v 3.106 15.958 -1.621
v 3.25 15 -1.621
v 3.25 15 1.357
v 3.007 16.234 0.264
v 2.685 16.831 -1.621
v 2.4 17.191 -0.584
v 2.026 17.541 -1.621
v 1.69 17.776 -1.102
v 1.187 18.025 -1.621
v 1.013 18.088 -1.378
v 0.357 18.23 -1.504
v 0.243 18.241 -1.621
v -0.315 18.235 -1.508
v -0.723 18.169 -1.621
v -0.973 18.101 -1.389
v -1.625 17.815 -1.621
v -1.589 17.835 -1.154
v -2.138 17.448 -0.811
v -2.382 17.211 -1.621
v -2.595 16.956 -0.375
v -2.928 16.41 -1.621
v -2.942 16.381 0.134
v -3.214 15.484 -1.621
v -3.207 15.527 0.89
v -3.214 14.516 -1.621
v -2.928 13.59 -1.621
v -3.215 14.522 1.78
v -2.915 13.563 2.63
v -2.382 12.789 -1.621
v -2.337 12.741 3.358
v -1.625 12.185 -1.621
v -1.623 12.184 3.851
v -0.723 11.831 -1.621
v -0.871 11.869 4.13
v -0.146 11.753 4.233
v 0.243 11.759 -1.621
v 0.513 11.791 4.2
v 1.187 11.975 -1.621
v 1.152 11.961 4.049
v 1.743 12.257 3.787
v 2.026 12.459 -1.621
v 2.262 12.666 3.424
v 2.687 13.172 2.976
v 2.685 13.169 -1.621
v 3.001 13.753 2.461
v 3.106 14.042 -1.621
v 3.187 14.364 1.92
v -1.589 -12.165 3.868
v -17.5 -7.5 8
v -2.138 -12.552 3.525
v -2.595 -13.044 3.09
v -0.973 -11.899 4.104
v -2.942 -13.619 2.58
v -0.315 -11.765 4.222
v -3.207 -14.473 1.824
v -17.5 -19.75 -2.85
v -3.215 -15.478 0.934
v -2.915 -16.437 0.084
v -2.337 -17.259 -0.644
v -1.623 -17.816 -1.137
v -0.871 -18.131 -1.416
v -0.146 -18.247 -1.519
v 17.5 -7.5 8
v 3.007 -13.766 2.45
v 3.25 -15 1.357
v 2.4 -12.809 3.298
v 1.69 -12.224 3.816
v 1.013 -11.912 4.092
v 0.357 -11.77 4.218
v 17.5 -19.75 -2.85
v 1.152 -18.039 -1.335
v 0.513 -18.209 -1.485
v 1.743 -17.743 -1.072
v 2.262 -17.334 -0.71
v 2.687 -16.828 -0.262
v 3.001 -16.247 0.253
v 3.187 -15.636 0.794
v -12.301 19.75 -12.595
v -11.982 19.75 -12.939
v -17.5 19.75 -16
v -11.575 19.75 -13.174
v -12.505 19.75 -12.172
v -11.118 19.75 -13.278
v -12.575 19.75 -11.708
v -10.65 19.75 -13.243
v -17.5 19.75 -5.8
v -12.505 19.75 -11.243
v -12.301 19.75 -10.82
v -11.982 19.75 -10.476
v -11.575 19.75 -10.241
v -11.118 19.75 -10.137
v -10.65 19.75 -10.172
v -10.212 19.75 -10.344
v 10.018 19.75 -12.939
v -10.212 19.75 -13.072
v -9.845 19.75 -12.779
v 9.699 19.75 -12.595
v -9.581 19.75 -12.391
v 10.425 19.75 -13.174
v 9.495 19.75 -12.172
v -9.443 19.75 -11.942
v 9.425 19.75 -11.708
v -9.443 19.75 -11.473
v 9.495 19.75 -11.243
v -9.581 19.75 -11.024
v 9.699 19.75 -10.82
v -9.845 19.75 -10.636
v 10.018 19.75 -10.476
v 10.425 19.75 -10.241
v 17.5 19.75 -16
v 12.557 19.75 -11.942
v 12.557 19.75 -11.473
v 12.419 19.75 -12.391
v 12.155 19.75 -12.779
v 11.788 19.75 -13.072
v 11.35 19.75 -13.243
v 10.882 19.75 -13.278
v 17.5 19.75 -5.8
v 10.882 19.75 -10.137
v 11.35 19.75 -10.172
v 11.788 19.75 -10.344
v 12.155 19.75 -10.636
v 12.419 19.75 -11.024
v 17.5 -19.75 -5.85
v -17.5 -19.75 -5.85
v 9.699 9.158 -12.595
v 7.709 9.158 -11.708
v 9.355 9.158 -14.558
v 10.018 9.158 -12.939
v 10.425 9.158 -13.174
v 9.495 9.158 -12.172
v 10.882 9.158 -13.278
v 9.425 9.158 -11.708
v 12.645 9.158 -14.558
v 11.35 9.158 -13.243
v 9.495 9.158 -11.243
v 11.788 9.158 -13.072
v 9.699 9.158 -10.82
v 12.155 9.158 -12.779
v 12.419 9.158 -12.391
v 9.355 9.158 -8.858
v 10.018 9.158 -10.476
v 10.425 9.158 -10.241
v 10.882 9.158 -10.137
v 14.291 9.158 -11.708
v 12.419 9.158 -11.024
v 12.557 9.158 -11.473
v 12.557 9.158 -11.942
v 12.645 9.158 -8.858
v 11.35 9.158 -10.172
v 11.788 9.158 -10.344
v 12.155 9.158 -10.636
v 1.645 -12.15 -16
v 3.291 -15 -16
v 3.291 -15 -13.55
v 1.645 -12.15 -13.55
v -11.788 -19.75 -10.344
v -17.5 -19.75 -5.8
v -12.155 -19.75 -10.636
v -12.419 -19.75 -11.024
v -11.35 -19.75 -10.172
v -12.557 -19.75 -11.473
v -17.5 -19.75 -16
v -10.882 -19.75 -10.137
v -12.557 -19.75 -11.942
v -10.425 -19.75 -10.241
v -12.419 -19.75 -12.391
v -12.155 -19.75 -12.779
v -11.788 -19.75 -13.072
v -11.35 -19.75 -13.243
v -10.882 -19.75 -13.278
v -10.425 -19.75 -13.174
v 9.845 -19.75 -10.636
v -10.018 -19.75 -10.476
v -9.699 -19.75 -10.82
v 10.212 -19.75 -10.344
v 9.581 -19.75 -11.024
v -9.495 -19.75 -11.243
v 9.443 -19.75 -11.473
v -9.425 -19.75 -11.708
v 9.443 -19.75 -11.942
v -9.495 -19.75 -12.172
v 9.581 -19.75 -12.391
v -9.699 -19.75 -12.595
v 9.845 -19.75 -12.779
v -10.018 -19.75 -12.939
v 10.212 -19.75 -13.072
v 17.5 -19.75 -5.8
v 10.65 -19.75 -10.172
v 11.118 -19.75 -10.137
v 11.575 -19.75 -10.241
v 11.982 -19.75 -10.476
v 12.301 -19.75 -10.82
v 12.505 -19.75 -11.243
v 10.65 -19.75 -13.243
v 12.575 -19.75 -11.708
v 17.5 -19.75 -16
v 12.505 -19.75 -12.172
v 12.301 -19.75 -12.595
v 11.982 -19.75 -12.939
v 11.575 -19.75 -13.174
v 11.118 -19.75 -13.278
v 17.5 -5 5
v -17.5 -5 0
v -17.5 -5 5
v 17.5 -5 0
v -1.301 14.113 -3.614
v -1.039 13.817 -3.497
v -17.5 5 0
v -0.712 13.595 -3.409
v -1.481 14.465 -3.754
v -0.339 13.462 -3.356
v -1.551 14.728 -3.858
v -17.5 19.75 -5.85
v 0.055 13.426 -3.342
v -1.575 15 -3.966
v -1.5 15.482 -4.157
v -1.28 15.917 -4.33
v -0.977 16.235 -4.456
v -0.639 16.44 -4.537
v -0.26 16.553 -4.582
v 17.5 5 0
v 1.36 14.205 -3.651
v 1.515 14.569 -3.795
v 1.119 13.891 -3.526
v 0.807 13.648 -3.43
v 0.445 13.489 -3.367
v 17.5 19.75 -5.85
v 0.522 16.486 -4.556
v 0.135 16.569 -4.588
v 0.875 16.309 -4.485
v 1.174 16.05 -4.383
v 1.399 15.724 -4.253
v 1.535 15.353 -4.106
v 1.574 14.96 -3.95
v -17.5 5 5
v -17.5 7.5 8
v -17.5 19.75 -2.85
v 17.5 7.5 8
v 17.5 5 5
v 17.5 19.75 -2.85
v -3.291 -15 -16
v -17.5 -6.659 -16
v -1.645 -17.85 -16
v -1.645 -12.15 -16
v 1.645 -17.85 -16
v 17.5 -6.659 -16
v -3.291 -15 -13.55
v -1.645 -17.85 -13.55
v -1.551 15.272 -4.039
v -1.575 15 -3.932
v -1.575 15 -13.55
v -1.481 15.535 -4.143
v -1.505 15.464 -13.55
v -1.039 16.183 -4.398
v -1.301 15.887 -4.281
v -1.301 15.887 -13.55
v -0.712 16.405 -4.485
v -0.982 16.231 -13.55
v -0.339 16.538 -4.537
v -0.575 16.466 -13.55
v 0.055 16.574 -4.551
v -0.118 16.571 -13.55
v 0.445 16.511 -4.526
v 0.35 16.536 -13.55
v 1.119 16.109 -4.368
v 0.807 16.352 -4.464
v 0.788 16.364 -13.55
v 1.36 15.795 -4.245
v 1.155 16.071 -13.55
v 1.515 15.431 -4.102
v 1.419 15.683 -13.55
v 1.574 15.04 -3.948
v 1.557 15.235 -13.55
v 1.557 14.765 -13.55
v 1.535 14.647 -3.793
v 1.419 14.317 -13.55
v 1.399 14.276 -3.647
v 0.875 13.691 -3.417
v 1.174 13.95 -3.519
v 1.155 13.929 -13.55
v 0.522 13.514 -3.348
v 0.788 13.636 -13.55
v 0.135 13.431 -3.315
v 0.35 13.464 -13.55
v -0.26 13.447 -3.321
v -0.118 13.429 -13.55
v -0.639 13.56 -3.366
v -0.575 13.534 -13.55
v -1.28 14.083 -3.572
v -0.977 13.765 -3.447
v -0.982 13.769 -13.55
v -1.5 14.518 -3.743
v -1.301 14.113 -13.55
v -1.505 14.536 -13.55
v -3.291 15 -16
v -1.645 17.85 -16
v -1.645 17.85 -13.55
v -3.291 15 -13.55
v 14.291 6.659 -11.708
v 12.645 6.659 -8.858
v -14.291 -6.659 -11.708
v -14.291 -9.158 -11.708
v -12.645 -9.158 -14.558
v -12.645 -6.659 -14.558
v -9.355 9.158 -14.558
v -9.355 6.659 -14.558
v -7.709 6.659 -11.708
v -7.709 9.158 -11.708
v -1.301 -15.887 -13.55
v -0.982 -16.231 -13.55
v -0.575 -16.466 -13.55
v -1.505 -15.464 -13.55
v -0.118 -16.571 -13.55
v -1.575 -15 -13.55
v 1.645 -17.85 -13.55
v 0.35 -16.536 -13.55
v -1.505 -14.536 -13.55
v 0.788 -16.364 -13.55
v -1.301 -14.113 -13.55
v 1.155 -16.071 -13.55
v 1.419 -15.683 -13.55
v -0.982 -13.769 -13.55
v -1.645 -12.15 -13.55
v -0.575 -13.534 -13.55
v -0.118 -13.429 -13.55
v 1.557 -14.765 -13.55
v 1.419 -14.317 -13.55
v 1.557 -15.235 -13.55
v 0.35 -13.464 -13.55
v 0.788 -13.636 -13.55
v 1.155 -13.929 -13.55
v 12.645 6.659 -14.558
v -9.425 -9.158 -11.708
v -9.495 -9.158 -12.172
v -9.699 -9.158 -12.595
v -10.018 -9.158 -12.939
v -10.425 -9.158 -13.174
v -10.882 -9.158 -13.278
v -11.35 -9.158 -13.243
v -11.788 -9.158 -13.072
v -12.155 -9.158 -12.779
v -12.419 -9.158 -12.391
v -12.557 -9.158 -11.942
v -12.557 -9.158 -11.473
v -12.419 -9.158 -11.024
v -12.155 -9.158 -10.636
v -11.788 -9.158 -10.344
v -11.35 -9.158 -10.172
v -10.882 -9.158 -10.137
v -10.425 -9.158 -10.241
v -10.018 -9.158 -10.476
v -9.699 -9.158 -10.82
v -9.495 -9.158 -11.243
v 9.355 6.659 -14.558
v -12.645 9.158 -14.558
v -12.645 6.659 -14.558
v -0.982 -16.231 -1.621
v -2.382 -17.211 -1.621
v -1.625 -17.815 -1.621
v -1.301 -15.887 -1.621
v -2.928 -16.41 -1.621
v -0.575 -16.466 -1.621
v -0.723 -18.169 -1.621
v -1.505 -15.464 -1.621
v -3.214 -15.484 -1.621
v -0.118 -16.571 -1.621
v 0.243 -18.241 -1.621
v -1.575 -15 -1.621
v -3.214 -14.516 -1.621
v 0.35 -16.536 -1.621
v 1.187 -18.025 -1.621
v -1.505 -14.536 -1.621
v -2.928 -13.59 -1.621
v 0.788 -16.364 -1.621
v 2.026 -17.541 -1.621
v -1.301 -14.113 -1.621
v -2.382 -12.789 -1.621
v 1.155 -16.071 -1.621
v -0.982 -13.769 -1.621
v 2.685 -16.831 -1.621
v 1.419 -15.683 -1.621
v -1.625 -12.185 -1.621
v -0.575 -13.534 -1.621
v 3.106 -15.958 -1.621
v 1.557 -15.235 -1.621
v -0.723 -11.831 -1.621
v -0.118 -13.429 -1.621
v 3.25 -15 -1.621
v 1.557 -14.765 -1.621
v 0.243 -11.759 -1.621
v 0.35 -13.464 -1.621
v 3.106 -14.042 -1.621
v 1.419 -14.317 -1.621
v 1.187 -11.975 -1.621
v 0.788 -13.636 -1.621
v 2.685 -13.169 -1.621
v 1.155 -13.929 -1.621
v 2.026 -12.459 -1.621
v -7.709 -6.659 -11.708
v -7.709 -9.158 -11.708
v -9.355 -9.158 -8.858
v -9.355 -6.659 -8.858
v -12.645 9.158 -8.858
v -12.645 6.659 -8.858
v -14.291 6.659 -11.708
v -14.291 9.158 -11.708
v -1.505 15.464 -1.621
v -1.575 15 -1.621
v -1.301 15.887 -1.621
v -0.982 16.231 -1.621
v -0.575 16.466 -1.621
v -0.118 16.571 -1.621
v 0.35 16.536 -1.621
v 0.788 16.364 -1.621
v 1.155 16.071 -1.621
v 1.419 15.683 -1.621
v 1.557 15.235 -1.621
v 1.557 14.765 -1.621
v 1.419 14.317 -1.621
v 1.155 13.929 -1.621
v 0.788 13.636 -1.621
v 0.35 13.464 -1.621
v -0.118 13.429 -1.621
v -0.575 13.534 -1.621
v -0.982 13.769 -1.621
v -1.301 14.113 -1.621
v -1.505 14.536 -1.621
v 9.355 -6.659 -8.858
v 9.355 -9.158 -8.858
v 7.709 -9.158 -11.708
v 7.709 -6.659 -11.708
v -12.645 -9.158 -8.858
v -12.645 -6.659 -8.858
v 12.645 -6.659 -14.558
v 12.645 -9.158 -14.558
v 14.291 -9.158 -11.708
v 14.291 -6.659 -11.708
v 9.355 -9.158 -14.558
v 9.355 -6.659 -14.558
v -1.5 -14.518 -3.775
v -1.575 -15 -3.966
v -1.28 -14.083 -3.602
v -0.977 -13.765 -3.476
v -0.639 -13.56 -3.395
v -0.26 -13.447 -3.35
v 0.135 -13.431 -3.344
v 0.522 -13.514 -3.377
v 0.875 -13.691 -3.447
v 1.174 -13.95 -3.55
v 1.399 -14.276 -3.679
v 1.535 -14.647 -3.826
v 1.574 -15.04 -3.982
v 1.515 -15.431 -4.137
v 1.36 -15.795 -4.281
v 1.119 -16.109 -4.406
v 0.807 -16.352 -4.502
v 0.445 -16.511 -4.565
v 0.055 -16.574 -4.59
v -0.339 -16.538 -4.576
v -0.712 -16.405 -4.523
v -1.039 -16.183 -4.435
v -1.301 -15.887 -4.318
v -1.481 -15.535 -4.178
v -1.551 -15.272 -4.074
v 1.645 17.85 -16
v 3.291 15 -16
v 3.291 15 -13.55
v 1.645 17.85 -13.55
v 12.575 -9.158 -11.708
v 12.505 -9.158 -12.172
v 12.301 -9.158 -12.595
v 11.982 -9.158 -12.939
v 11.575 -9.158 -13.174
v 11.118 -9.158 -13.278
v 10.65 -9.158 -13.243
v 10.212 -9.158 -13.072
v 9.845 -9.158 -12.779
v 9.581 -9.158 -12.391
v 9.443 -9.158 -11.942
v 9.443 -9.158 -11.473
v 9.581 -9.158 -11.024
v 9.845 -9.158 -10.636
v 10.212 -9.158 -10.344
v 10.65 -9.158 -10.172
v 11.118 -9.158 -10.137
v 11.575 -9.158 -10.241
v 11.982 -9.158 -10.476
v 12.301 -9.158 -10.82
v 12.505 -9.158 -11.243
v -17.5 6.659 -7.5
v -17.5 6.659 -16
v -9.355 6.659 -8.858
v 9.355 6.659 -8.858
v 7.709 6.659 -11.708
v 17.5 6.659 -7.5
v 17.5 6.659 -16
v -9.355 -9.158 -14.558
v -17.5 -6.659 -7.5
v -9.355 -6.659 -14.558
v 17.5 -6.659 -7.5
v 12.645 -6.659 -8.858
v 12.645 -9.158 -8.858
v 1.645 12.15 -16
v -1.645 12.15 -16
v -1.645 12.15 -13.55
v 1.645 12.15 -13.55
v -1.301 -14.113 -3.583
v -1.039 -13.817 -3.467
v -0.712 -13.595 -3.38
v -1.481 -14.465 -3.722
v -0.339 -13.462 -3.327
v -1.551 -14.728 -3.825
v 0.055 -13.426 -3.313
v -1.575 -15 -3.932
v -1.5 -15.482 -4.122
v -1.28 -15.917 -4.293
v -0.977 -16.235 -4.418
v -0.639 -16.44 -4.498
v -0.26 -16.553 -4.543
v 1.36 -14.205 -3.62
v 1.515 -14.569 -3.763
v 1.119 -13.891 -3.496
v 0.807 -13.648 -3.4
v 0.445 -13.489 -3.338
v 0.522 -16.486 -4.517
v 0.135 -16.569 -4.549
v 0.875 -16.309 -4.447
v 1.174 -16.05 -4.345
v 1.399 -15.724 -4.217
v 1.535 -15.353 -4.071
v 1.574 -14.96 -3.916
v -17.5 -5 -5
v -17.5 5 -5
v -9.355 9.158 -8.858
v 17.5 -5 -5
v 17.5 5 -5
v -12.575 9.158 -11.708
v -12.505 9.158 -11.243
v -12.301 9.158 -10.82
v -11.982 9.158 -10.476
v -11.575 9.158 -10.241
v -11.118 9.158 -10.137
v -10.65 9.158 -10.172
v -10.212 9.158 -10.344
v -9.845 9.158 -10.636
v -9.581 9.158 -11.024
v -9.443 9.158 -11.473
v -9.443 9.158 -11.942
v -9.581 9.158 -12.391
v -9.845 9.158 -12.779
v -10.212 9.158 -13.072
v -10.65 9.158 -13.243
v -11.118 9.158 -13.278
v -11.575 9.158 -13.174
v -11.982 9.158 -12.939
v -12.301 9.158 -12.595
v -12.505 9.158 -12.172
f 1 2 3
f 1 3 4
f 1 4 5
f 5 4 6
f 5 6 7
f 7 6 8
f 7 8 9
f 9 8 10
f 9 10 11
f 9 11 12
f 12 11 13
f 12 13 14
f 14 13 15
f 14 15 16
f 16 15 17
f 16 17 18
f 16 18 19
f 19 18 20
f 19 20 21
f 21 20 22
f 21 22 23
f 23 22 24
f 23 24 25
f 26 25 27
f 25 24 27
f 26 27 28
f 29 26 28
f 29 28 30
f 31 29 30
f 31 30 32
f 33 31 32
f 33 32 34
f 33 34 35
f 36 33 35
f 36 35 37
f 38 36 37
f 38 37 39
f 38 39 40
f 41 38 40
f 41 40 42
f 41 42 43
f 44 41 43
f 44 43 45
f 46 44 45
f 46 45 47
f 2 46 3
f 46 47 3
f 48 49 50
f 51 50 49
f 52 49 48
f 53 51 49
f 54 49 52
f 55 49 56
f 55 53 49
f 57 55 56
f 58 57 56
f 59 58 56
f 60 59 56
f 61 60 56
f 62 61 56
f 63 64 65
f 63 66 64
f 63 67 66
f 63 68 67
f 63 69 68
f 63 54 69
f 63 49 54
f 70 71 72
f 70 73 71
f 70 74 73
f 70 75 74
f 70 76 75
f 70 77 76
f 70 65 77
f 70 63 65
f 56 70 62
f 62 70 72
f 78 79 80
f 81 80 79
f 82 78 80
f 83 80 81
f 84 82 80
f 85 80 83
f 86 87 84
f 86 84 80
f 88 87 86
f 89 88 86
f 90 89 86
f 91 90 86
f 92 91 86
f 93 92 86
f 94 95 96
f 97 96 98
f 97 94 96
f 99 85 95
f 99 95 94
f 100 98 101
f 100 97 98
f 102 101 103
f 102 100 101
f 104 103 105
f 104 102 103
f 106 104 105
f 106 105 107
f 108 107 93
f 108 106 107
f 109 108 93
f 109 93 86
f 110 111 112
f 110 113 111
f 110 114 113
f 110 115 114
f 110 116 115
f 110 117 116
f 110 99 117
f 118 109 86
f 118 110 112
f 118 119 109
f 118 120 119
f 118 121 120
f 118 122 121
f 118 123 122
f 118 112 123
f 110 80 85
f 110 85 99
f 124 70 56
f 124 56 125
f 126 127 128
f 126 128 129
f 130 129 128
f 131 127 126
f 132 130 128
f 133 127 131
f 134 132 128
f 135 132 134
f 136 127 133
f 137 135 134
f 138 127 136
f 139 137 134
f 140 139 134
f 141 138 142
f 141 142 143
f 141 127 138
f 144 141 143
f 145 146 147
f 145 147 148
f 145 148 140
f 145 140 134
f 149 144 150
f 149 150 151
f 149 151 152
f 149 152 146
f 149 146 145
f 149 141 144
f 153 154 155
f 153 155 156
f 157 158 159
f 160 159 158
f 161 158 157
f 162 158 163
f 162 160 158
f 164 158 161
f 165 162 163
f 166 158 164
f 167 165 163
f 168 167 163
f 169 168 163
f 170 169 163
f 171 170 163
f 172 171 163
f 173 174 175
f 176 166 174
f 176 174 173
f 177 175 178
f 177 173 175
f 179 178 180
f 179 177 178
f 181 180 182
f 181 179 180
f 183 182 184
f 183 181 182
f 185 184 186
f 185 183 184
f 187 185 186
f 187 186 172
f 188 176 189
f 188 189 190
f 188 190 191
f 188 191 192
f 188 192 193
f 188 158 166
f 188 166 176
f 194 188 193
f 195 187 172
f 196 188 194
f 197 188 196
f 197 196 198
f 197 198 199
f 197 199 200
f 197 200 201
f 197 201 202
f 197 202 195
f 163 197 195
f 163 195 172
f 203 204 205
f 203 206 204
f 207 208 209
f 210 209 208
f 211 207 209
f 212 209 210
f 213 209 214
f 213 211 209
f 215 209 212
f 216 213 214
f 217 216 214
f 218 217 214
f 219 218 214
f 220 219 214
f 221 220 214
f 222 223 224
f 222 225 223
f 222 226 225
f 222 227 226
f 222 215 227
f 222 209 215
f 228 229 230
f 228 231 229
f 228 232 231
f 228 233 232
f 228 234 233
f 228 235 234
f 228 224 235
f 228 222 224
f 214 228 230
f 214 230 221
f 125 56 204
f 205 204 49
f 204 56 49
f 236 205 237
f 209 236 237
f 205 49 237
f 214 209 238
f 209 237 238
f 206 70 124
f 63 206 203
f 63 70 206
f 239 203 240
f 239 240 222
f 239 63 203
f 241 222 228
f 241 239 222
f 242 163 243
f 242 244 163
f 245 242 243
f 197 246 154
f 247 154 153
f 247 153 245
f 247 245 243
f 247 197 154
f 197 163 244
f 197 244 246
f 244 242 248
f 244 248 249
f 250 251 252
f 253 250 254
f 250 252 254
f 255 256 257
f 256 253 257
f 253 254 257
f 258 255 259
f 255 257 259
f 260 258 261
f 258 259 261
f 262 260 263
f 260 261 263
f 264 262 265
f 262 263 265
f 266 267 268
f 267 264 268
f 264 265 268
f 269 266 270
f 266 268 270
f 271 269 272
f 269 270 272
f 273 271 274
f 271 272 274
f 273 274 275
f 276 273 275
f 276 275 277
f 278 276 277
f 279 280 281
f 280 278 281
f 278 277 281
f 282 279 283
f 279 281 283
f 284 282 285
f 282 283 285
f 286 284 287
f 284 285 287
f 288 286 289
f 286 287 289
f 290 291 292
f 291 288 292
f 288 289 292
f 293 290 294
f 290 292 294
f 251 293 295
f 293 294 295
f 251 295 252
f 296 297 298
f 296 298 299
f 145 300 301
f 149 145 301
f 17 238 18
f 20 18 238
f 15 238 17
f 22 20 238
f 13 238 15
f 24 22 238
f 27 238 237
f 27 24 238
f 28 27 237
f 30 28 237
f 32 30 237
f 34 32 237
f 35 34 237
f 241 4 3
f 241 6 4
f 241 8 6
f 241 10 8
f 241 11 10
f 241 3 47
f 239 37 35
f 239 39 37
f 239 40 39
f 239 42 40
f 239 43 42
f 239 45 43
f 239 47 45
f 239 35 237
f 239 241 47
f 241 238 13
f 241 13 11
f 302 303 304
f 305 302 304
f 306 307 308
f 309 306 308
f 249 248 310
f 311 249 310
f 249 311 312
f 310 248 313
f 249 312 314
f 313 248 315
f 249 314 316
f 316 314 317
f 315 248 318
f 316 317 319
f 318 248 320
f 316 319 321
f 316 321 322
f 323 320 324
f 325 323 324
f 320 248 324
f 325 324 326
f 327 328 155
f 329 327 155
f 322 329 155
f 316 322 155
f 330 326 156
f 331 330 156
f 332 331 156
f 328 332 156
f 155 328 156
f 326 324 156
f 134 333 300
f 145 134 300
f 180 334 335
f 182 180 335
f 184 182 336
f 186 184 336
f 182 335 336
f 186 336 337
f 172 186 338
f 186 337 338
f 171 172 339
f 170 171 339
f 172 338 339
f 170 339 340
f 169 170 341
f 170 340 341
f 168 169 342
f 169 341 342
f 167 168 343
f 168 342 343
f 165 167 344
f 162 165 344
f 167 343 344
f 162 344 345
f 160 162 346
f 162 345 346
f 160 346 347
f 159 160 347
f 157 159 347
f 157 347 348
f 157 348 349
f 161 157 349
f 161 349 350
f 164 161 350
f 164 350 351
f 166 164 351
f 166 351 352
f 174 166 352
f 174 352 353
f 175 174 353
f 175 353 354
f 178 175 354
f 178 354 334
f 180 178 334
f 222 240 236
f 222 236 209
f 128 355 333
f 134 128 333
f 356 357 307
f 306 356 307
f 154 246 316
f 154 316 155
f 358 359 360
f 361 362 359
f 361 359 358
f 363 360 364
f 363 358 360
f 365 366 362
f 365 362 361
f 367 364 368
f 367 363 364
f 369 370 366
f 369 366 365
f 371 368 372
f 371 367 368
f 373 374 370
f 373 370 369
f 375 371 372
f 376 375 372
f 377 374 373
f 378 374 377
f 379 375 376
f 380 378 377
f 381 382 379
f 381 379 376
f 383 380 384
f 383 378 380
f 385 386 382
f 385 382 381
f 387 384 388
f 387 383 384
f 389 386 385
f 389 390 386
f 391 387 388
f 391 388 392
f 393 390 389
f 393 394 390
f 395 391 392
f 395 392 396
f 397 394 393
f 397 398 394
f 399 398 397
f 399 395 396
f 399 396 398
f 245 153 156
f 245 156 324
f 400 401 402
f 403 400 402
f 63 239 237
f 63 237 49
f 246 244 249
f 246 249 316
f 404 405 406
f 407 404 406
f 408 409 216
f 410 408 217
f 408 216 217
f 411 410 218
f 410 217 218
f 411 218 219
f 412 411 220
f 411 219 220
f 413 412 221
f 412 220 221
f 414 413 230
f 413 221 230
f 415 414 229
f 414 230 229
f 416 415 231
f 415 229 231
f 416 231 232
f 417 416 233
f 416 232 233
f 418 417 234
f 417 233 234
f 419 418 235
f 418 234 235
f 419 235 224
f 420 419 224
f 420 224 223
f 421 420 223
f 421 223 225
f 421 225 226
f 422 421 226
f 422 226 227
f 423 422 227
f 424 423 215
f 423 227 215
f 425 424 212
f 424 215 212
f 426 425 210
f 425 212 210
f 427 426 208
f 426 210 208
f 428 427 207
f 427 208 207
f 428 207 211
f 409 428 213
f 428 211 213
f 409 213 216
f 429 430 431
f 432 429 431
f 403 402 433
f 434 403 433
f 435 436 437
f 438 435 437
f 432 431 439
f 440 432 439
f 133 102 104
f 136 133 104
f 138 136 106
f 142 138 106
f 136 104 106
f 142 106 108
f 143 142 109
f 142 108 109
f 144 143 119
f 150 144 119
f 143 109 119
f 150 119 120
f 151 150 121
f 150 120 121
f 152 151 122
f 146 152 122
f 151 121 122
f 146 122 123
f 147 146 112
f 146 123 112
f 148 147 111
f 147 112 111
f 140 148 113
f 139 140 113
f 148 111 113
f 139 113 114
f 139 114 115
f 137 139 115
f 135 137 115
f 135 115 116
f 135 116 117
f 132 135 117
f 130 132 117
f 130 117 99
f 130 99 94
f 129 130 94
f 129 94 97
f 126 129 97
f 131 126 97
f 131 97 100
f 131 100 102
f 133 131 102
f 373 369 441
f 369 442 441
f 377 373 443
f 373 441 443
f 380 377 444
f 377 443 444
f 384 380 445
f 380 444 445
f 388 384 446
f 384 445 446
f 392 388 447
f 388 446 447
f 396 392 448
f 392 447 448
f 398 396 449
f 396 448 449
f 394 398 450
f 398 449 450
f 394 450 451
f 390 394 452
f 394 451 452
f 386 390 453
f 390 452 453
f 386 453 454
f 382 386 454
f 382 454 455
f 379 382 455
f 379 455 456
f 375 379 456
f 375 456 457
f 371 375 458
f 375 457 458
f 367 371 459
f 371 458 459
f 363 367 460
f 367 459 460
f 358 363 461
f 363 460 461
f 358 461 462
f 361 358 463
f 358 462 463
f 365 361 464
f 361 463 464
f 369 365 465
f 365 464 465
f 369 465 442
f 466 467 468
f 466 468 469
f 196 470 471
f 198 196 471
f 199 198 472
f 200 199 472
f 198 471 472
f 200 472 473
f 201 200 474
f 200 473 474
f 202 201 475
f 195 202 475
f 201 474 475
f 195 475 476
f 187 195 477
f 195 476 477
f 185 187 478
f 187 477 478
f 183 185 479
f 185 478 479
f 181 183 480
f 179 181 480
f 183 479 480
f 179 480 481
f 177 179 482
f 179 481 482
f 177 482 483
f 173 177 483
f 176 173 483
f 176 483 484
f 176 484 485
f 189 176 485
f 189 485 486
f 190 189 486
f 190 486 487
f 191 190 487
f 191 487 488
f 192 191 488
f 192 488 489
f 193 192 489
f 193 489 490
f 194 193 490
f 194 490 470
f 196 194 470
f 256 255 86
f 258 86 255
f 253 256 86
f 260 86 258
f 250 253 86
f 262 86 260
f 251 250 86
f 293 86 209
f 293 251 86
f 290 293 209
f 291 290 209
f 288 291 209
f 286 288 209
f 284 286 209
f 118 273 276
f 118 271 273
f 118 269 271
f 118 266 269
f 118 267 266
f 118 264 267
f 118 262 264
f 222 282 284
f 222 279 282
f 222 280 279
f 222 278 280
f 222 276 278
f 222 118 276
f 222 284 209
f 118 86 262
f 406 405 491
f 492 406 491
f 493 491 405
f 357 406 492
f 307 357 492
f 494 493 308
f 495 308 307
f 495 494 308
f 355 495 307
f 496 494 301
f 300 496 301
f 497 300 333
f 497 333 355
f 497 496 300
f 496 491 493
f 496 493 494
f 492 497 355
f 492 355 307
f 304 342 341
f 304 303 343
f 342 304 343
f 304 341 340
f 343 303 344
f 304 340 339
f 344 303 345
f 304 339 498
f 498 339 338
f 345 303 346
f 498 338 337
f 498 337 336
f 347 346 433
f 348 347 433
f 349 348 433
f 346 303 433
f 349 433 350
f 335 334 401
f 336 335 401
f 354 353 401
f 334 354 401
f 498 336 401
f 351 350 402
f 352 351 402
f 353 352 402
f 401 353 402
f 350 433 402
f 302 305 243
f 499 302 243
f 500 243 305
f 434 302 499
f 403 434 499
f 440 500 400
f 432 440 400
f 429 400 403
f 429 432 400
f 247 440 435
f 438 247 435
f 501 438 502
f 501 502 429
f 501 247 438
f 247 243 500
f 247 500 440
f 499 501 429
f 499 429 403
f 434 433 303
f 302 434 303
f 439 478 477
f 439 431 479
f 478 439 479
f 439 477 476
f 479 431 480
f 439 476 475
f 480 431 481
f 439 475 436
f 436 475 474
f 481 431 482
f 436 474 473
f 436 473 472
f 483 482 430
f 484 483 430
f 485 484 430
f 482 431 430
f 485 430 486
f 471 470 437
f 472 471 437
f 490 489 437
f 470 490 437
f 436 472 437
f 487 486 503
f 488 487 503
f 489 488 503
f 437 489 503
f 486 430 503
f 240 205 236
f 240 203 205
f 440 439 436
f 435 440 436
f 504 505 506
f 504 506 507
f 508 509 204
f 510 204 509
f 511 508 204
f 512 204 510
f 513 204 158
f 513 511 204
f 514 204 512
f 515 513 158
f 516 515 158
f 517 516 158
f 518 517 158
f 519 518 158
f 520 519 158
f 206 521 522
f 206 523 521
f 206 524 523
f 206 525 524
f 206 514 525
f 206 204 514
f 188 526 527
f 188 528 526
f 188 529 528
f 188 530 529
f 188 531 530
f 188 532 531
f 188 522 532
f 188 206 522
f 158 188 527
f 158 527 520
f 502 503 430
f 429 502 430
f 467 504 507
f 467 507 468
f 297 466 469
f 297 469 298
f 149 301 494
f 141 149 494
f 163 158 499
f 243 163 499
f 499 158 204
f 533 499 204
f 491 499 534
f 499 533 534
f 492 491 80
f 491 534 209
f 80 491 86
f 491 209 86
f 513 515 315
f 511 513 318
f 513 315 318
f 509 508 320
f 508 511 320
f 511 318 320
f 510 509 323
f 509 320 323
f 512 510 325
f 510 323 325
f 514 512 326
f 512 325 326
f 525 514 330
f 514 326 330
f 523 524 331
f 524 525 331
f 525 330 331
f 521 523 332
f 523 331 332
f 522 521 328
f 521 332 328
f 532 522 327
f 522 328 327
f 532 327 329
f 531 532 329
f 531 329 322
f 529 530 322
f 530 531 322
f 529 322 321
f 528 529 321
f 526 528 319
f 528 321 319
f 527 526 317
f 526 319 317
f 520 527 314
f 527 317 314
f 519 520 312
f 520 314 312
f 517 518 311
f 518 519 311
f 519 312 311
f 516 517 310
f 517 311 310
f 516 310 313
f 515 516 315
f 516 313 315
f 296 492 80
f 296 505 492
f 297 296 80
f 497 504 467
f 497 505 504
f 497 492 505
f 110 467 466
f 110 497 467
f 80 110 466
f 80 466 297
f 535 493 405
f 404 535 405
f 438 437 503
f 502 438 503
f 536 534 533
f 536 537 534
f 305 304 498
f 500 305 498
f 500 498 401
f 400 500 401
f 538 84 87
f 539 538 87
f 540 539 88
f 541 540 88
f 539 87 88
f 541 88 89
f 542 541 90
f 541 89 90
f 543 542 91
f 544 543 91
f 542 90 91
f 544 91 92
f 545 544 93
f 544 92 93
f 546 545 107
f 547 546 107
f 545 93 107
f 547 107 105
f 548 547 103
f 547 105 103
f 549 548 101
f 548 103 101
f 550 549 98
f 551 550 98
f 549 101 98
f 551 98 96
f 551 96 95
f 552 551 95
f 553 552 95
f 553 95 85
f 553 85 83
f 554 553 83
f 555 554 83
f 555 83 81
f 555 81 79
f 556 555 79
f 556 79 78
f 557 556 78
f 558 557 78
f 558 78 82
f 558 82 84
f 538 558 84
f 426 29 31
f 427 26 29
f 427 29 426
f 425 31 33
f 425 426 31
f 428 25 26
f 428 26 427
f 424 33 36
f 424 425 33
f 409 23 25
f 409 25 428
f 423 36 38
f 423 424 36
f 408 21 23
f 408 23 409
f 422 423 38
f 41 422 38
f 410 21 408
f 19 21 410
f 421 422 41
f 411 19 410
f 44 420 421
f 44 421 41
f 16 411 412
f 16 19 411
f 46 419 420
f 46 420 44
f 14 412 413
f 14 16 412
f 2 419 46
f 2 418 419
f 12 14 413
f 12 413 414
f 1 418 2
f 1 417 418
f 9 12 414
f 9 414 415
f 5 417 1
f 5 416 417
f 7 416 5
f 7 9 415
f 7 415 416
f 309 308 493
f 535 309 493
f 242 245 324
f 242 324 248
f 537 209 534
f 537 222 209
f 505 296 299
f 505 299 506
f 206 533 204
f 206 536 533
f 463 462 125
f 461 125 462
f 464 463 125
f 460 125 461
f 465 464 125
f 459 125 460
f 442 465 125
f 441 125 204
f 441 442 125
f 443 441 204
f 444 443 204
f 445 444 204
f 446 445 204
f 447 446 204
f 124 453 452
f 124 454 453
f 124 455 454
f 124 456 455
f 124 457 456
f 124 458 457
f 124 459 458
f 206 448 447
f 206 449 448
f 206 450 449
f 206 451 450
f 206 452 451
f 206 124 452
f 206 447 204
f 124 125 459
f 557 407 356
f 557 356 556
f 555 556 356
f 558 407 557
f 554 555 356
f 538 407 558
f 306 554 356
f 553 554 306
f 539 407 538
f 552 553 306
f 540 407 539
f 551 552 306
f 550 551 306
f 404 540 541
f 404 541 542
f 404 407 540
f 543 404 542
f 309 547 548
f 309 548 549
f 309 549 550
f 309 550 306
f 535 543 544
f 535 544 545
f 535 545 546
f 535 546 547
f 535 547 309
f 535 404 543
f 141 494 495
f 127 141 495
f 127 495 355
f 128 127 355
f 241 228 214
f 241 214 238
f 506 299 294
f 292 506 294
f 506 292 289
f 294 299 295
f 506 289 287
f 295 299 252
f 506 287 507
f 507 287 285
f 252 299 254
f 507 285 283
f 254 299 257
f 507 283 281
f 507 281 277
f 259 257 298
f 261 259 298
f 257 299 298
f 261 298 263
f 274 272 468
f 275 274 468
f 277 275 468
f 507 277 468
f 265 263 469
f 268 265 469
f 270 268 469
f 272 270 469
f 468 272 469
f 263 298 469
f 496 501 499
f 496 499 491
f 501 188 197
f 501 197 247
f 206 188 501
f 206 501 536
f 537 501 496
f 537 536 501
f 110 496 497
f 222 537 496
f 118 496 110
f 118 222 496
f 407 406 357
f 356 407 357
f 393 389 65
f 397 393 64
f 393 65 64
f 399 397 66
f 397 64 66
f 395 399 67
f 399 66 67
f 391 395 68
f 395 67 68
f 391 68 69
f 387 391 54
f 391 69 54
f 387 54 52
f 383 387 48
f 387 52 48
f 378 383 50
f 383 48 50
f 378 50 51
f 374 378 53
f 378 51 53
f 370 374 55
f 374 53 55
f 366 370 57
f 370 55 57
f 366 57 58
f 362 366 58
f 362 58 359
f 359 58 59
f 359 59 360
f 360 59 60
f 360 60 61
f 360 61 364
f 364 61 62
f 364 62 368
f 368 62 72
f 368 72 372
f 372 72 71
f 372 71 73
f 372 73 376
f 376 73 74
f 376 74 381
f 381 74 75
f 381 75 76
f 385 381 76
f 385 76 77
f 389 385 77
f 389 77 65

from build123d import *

# Parameters (mm, degrees)
F2_DEPTH          = 17.5
F3_DEPTH          = 17.5
F5_D              = 3.15
F5_DEPTH          = 19.751
F6_D              = 3.15
F7_DEPTH          = 9.1585
F12_D             = 3.15
F12_START         = 16.5214286
F12_CBORE_D       = 6.5
F12_CBORE_DEPTH   = 0.1
F12_2_D           = 3.15
F12_2_START       = 16.5214286
F12_2_CBORE_D     = 6.5
F12_2_CBORE_DEPTH = 0.1
F15_DEPTH         = 3.5


with BuildPart() as f2:
    # F1 (on Right) → F2 (new body, symmetric)
    with BuildSketch(Plane.YZ):
        Polygon((-5, -5), (-5, 0), (-19.75, -5.8), (-19.75, -16), (-6.6586033699, -16), (-6.6586033699, -7.5), (0, -7.5), (0, -5), align=None)
        Polygon((5, -5), (0, -5), (0, -7.5), (6.6586033699, -7.5), (6.6586033699, -16), (19.75, -16), (19.75, -5.8), (5, 0), align=None)
    extrude(amount=F2_DEPTH, both=True)

    # F5 (through all, one way)
    with BuildSketch(Plane(origin=(0, 0, 0), x_dir=(1, 0, 0), z_dir=(0, 1, 0))):
        with Locations((-11, 11.7075736617), (11, 11.7075736617)):
            Circle(F5_D / 2)
    extrude(amount=-F5_DEPTH, mode=Mode.SUBTRACT)

    # F6 (through all)
    with Locations(Plane.XZ):
        with Locations((-11, -11.7075736617), (11, -11.7075736617)):
            Hole(F6_D / 2)


with BuildPart() as f3:
    # F0 (on Right) → F3 (new body, symmetric)
    with BuildSketch(Plane.YZ):
        Polygon((-5, 5), (0, 5), (5, 5), (5, 0), (19.75, -5.85), (19.75, -2.85), (7.5, 8), (0, 8), (-7.5, 8), (-19.75, -2.85), (-19.75, -5.85), (-5, 0), align=None)
    extrude(amount=F3_DEPTH, both=True)

    # F12#2 (through all)
    # its depths count from where the whole tool has entered the part; down to there all is cleared
    with Locations(Plane.XY.offset(15).offset(-F12_2_START)):
        with Locations((0, 15), (0, -15)):
            CounterBoreHole(F12_2_D / 2, F12_2_CBORE_D / 2, F12_2_CBORE_DEPTH)


with BuildPart() as f7:
    # F4 (on Front) → F7 (new body, symmetric)
    with BuildSketch(Plane.XZ):
        Polygon((9.3545517328, -8.8575736617), (7.7091034656, -11.7075736617), (9.3545517328, -14.5575736617), (12.6454482672, -14.5575736617), (14.2908965344, -11.7075736617), (12.6454482672, -8.8575736617), align=None)
    extrude(amount=F7_DEPTH, both=True)


with BuildPart() as f7b:
    # F4 (on Front) → F7, piece 2 (new body, symmetric)
    with BuildSketch(Plane.XZ):
        Polygon((-9.3545517328, -14.5575736617), (-7.7091034656, -11.7075736617), (-9.3545517328, -8.8575736617), (-12.6454482672, -8.8575736617), (-14.2908965344, -11.7075736617), (-12.6454482672, -14.5575736617), align=None)
    extrude(amount=F7_DEPTH, both=True)


with BuildPart() as f2_1:
    add(f2.part)

    # F8: cut F7
    add(f7.part, mode=Mode.SUBTRACT)

    # F9: cut F7b
    add(f7b.part, mode=Mode.SUBTRACT)

    # F12 (through all)
    # its depths count from where the whole tool has entered the part; down to there all is cleared
    with Locations(Plane.XY.offset(15).offset(-F12_START)):
        with Locations((0, 15), (0, -15)):
            CounterBoreHole(F12_D / 2, F12_CBORE_D / 2, F12_CBORE_DEPTH)


with BuildPart() as f15:
    # F14 (on offset) → F15 (new body)
    with BuildSketch(Plane.XY.offset(-17.05)):
        Polygon((3.2908965344, -15), (1.6454482672, -12.15), (-1.6454482672, -12.15), (-3.2908965344, -15), (-1.6454482672, -17.85), (1.6454482672, -17.85), align=None)
    extrude(amount=F15_DEPTH)


with BuildPart() as f15b:
    # F14 (on offset) → F15, piece 2 (new body)
    with BuildSketch(Plane.XY.offset(-17.05)):
        Polygon((3.2908965344, 15), (1.6454482672, 17.85), (-1.6454482672, 17.85), (-3.2908965344, 15), (-1.6454482672, 12.15), (1.6454482672, 12.15), align=None)
    extrude(amount=F15_DEPTH)


with BuildPart() as f2_2:
    add(f2_1.part)

    # F16: cut F15
    add(f15.part, mode=Mode.SUBTRACT)

    # F17: cut F15b
    add(f15b.part, mode=Mode.SUBTRACT)


solid = Compound([f3.part, f2_2.part])
